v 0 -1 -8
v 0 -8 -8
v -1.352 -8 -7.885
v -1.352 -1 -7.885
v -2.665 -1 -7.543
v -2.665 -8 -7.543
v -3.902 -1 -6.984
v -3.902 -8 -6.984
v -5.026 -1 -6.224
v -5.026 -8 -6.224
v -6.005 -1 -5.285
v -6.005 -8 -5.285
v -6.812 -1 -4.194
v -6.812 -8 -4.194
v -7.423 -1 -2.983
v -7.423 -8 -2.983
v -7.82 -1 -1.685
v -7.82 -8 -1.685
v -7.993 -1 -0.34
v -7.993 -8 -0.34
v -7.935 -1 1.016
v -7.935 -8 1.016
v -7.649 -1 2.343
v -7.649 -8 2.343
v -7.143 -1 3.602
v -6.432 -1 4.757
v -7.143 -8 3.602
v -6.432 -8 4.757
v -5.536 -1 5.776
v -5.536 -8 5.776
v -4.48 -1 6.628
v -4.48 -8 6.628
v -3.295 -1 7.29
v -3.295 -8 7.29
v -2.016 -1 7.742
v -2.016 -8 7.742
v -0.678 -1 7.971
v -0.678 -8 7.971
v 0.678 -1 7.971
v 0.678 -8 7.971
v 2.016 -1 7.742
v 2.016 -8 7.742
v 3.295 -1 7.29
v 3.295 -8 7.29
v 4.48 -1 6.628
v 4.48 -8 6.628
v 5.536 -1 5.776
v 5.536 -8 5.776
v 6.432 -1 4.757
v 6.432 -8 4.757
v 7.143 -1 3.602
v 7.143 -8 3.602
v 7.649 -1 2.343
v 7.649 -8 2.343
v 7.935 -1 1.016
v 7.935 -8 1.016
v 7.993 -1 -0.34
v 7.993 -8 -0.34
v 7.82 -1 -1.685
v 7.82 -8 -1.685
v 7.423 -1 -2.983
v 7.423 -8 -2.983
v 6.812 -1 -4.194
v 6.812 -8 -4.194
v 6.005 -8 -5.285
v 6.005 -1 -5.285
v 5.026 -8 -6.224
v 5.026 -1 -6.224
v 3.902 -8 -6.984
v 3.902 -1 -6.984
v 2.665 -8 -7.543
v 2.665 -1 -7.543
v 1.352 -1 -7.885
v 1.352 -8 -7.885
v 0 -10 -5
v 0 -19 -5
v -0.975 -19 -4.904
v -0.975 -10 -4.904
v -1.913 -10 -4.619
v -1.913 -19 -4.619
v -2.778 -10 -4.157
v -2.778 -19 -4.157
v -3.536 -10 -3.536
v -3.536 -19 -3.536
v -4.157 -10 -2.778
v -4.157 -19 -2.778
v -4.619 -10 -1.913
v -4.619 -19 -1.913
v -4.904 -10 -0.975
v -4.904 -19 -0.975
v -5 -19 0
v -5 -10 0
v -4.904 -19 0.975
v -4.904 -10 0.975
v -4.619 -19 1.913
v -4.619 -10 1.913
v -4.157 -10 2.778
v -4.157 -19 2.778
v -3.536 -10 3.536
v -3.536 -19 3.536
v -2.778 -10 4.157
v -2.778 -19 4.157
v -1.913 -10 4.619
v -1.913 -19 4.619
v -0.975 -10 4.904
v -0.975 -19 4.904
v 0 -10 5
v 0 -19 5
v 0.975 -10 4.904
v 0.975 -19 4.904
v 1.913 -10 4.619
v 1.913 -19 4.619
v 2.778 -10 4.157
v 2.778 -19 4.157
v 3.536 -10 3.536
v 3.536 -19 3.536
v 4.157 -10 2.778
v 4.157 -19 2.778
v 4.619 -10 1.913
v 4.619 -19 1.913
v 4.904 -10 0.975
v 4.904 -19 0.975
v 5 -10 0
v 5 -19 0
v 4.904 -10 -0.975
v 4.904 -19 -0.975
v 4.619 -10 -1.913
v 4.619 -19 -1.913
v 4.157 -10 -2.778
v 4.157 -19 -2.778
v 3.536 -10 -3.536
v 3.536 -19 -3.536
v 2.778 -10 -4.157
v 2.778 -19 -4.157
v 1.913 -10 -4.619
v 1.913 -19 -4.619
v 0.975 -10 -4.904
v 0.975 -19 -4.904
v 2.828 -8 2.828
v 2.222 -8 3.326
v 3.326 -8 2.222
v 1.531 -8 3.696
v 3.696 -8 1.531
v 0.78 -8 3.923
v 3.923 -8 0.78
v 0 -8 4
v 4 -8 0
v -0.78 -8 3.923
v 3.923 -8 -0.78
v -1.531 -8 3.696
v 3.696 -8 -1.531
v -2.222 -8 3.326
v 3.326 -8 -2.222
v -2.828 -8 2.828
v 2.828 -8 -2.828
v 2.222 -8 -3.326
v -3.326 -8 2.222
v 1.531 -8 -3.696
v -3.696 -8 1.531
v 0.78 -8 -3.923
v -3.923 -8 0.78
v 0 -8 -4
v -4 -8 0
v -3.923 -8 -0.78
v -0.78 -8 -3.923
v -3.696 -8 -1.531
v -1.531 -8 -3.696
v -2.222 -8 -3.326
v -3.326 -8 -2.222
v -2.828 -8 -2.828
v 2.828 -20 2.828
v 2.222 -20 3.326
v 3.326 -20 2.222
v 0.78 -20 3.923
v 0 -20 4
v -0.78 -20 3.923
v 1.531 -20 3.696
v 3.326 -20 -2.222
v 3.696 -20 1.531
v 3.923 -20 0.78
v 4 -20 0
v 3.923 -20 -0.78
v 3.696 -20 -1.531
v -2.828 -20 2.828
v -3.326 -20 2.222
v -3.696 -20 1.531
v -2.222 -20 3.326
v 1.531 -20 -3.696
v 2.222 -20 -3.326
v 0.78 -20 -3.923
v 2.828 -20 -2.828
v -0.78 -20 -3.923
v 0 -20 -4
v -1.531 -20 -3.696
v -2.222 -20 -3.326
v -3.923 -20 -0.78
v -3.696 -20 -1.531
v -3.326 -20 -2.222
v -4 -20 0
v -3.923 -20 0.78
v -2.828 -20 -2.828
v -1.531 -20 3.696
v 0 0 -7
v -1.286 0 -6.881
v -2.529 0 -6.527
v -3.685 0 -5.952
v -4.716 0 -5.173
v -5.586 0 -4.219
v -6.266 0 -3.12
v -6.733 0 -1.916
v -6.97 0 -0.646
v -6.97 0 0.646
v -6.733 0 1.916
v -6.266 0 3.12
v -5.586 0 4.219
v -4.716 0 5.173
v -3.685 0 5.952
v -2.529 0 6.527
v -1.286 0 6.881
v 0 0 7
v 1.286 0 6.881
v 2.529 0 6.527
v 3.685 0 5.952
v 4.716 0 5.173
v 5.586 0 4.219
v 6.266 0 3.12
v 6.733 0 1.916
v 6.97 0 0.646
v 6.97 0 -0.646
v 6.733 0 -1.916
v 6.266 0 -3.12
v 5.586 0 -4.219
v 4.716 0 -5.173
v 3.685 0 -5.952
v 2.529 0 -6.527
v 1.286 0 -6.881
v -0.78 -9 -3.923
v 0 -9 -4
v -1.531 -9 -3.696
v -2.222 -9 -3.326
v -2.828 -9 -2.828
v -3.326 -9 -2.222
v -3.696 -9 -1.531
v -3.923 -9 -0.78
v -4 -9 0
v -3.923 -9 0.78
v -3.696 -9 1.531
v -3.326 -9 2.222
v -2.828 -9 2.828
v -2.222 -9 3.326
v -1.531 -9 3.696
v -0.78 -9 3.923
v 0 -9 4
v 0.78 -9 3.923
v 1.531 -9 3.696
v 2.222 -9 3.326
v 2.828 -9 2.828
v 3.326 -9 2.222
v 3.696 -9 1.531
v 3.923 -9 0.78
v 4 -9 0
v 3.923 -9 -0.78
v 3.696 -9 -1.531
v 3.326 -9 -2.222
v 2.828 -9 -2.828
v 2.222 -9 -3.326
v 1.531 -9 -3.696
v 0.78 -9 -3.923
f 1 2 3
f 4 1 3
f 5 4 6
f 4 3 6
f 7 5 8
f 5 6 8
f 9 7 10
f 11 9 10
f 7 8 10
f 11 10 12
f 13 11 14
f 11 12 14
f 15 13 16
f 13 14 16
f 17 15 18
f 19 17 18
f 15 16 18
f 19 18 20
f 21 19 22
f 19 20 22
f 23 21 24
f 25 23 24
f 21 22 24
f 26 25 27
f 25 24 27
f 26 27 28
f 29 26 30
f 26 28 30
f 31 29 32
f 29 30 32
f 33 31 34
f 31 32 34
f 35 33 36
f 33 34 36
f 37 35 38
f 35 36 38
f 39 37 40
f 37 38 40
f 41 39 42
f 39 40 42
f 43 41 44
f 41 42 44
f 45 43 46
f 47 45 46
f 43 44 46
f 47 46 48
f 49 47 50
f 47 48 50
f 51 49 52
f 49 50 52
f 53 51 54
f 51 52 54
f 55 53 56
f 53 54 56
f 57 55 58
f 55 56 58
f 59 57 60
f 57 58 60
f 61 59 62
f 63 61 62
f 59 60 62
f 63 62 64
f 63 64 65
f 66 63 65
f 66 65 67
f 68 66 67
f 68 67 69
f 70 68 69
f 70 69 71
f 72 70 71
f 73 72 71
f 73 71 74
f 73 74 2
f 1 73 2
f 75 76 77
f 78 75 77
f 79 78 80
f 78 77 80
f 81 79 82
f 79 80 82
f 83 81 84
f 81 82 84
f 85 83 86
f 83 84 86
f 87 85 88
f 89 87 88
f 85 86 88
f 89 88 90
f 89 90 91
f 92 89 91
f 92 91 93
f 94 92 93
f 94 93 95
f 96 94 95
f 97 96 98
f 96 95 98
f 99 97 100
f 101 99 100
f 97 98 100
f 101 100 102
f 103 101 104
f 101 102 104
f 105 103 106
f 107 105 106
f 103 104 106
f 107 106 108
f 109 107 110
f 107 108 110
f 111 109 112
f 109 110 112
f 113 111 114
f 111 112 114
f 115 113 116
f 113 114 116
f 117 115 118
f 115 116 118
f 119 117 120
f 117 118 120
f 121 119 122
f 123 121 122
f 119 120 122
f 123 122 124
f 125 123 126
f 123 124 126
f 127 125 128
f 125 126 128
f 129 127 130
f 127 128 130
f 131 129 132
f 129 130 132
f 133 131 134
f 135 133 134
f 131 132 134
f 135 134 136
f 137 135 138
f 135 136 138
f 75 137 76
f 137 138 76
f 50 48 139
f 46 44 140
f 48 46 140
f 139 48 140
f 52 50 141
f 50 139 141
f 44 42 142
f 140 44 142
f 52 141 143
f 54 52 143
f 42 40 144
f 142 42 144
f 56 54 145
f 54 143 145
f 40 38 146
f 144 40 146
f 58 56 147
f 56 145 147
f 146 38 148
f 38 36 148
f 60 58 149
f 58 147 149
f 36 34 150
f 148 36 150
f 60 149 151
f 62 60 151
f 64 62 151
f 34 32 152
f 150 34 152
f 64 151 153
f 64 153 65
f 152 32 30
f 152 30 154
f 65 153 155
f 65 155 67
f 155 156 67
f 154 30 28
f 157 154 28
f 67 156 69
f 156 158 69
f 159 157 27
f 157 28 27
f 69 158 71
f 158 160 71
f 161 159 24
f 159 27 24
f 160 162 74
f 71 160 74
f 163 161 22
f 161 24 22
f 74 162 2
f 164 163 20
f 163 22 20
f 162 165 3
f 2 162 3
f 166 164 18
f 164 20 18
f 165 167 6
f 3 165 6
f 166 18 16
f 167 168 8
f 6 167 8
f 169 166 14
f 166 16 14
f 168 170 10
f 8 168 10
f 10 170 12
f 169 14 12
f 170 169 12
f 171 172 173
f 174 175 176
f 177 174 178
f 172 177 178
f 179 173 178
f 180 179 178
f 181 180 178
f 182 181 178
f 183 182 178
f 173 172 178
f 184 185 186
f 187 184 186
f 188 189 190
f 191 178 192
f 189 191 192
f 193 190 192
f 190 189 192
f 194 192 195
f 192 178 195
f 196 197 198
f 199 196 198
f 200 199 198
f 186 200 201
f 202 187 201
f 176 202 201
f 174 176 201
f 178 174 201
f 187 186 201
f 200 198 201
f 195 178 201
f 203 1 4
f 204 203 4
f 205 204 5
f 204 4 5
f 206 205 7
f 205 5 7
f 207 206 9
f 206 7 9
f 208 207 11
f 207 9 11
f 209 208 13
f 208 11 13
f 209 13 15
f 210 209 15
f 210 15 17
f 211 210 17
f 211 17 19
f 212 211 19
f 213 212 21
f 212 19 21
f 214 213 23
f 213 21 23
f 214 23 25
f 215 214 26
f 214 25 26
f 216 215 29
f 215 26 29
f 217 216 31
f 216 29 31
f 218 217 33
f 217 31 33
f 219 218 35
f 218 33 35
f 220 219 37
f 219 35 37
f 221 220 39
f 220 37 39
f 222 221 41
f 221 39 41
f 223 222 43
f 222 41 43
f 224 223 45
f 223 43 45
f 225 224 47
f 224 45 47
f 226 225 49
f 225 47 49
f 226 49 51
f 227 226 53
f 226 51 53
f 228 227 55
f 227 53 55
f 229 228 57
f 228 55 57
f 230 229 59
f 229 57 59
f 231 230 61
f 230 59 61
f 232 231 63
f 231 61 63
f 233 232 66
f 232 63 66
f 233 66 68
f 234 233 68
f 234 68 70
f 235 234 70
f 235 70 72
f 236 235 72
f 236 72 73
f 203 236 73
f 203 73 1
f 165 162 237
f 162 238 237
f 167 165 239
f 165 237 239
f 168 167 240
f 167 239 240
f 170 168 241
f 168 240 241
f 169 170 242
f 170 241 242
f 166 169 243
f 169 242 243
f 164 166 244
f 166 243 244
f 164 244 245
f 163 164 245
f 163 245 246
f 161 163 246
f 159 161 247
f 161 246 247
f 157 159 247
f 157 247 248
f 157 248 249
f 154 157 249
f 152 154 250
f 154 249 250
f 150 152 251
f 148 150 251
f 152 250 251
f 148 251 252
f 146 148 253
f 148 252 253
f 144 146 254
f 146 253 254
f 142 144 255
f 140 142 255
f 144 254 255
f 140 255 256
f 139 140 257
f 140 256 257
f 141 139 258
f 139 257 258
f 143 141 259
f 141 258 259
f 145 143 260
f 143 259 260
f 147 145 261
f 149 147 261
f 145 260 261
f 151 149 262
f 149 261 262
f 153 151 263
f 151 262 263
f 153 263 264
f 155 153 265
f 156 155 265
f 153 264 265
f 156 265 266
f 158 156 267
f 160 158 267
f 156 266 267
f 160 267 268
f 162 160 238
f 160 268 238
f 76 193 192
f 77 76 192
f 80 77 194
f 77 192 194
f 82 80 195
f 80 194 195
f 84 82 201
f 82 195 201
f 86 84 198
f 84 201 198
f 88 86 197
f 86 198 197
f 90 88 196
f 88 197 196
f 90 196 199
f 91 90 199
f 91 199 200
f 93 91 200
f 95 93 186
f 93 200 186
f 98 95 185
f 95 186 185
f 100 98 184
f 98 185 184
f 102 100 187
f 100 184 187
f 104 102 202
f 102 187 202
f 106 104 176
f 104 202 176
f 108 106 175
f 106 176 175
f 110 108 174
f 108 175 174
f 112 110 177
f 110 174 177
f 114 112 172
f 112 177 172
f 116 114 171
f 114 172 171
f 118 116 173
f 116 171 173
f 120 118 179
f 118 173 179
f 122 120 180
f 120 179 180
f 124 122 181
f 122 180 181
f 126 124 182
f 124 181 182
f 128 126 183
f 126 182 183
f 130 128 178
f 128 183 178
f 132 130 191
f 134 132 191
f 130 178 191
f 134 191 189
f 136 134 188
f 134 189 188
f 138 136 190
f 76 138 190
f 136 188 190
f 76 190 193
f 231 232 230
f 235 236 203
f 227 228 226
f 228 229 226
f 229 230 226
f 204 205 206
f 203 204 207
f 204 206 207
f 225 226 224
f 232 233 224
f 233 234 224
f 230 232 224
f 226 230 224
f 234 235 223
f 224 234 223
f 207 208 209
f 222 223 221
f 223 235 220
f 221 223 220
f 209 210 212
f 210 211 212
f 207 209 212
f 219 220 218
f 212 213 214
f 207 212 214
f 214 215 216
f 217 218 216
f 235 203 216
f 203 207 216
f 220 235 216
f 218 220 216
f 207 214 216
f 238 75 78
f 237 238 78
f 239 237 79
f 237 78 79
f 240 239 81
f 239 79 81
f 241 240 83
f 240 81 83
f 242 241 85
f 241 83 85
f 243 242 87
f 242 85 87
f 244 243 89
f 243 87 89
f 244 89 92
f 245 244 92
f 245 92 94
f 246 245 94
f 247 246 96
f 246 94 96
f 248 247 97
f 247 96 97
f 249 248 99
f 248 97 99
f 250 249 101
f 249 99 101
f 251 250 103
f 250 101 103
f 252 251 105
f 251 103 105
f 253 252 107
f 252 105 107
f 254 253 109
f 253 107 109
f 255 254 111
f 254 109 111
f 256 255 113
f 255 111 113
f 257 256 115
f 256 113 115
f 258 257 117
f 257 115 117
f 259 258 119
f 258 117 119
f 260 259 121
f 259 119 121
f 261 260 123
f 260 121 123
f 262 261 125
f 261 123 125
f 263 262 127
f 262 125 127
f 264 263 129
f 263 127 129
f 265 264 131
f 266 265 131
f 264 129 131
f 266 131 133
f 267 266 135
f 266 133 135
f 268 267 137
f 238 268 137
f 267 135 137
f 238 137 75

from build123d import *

# Parameters (mm, degrees)
CHAMFER_1_SIZE = 1


with BuildPart() as part:
    # 草图1 → 旋转1 (revolve)
    with BuildSketch(Plane.XY, mode=Mode.PRIVATE) as revolve_1_sk:
        Polygon((0, 0), (8, 0), (8, -8), (4, -8), (4, -9), (5, -9), (5, -20), (0, -20), align=None)
    revolve(revolve_1_sk.sketch.rotate(Axis((0, -20, 0), (0, 1, 0)), 90), axis=Axis((0, -20, 0), (0, 1, 0)))

    # 倒角1
    chamfer_1_edges = [part.edges().sort_by_distance(p)[0] for p in [
        (0, -20, 5),
        (0, -9, 5),
        (0, 0, 8),
    ]]
    chamfer(chamfer_1_edges, length=CHAMFER_1_SIZE - 0.0001)  # a hair under: the kernel refuses the full size


solid = part.part
